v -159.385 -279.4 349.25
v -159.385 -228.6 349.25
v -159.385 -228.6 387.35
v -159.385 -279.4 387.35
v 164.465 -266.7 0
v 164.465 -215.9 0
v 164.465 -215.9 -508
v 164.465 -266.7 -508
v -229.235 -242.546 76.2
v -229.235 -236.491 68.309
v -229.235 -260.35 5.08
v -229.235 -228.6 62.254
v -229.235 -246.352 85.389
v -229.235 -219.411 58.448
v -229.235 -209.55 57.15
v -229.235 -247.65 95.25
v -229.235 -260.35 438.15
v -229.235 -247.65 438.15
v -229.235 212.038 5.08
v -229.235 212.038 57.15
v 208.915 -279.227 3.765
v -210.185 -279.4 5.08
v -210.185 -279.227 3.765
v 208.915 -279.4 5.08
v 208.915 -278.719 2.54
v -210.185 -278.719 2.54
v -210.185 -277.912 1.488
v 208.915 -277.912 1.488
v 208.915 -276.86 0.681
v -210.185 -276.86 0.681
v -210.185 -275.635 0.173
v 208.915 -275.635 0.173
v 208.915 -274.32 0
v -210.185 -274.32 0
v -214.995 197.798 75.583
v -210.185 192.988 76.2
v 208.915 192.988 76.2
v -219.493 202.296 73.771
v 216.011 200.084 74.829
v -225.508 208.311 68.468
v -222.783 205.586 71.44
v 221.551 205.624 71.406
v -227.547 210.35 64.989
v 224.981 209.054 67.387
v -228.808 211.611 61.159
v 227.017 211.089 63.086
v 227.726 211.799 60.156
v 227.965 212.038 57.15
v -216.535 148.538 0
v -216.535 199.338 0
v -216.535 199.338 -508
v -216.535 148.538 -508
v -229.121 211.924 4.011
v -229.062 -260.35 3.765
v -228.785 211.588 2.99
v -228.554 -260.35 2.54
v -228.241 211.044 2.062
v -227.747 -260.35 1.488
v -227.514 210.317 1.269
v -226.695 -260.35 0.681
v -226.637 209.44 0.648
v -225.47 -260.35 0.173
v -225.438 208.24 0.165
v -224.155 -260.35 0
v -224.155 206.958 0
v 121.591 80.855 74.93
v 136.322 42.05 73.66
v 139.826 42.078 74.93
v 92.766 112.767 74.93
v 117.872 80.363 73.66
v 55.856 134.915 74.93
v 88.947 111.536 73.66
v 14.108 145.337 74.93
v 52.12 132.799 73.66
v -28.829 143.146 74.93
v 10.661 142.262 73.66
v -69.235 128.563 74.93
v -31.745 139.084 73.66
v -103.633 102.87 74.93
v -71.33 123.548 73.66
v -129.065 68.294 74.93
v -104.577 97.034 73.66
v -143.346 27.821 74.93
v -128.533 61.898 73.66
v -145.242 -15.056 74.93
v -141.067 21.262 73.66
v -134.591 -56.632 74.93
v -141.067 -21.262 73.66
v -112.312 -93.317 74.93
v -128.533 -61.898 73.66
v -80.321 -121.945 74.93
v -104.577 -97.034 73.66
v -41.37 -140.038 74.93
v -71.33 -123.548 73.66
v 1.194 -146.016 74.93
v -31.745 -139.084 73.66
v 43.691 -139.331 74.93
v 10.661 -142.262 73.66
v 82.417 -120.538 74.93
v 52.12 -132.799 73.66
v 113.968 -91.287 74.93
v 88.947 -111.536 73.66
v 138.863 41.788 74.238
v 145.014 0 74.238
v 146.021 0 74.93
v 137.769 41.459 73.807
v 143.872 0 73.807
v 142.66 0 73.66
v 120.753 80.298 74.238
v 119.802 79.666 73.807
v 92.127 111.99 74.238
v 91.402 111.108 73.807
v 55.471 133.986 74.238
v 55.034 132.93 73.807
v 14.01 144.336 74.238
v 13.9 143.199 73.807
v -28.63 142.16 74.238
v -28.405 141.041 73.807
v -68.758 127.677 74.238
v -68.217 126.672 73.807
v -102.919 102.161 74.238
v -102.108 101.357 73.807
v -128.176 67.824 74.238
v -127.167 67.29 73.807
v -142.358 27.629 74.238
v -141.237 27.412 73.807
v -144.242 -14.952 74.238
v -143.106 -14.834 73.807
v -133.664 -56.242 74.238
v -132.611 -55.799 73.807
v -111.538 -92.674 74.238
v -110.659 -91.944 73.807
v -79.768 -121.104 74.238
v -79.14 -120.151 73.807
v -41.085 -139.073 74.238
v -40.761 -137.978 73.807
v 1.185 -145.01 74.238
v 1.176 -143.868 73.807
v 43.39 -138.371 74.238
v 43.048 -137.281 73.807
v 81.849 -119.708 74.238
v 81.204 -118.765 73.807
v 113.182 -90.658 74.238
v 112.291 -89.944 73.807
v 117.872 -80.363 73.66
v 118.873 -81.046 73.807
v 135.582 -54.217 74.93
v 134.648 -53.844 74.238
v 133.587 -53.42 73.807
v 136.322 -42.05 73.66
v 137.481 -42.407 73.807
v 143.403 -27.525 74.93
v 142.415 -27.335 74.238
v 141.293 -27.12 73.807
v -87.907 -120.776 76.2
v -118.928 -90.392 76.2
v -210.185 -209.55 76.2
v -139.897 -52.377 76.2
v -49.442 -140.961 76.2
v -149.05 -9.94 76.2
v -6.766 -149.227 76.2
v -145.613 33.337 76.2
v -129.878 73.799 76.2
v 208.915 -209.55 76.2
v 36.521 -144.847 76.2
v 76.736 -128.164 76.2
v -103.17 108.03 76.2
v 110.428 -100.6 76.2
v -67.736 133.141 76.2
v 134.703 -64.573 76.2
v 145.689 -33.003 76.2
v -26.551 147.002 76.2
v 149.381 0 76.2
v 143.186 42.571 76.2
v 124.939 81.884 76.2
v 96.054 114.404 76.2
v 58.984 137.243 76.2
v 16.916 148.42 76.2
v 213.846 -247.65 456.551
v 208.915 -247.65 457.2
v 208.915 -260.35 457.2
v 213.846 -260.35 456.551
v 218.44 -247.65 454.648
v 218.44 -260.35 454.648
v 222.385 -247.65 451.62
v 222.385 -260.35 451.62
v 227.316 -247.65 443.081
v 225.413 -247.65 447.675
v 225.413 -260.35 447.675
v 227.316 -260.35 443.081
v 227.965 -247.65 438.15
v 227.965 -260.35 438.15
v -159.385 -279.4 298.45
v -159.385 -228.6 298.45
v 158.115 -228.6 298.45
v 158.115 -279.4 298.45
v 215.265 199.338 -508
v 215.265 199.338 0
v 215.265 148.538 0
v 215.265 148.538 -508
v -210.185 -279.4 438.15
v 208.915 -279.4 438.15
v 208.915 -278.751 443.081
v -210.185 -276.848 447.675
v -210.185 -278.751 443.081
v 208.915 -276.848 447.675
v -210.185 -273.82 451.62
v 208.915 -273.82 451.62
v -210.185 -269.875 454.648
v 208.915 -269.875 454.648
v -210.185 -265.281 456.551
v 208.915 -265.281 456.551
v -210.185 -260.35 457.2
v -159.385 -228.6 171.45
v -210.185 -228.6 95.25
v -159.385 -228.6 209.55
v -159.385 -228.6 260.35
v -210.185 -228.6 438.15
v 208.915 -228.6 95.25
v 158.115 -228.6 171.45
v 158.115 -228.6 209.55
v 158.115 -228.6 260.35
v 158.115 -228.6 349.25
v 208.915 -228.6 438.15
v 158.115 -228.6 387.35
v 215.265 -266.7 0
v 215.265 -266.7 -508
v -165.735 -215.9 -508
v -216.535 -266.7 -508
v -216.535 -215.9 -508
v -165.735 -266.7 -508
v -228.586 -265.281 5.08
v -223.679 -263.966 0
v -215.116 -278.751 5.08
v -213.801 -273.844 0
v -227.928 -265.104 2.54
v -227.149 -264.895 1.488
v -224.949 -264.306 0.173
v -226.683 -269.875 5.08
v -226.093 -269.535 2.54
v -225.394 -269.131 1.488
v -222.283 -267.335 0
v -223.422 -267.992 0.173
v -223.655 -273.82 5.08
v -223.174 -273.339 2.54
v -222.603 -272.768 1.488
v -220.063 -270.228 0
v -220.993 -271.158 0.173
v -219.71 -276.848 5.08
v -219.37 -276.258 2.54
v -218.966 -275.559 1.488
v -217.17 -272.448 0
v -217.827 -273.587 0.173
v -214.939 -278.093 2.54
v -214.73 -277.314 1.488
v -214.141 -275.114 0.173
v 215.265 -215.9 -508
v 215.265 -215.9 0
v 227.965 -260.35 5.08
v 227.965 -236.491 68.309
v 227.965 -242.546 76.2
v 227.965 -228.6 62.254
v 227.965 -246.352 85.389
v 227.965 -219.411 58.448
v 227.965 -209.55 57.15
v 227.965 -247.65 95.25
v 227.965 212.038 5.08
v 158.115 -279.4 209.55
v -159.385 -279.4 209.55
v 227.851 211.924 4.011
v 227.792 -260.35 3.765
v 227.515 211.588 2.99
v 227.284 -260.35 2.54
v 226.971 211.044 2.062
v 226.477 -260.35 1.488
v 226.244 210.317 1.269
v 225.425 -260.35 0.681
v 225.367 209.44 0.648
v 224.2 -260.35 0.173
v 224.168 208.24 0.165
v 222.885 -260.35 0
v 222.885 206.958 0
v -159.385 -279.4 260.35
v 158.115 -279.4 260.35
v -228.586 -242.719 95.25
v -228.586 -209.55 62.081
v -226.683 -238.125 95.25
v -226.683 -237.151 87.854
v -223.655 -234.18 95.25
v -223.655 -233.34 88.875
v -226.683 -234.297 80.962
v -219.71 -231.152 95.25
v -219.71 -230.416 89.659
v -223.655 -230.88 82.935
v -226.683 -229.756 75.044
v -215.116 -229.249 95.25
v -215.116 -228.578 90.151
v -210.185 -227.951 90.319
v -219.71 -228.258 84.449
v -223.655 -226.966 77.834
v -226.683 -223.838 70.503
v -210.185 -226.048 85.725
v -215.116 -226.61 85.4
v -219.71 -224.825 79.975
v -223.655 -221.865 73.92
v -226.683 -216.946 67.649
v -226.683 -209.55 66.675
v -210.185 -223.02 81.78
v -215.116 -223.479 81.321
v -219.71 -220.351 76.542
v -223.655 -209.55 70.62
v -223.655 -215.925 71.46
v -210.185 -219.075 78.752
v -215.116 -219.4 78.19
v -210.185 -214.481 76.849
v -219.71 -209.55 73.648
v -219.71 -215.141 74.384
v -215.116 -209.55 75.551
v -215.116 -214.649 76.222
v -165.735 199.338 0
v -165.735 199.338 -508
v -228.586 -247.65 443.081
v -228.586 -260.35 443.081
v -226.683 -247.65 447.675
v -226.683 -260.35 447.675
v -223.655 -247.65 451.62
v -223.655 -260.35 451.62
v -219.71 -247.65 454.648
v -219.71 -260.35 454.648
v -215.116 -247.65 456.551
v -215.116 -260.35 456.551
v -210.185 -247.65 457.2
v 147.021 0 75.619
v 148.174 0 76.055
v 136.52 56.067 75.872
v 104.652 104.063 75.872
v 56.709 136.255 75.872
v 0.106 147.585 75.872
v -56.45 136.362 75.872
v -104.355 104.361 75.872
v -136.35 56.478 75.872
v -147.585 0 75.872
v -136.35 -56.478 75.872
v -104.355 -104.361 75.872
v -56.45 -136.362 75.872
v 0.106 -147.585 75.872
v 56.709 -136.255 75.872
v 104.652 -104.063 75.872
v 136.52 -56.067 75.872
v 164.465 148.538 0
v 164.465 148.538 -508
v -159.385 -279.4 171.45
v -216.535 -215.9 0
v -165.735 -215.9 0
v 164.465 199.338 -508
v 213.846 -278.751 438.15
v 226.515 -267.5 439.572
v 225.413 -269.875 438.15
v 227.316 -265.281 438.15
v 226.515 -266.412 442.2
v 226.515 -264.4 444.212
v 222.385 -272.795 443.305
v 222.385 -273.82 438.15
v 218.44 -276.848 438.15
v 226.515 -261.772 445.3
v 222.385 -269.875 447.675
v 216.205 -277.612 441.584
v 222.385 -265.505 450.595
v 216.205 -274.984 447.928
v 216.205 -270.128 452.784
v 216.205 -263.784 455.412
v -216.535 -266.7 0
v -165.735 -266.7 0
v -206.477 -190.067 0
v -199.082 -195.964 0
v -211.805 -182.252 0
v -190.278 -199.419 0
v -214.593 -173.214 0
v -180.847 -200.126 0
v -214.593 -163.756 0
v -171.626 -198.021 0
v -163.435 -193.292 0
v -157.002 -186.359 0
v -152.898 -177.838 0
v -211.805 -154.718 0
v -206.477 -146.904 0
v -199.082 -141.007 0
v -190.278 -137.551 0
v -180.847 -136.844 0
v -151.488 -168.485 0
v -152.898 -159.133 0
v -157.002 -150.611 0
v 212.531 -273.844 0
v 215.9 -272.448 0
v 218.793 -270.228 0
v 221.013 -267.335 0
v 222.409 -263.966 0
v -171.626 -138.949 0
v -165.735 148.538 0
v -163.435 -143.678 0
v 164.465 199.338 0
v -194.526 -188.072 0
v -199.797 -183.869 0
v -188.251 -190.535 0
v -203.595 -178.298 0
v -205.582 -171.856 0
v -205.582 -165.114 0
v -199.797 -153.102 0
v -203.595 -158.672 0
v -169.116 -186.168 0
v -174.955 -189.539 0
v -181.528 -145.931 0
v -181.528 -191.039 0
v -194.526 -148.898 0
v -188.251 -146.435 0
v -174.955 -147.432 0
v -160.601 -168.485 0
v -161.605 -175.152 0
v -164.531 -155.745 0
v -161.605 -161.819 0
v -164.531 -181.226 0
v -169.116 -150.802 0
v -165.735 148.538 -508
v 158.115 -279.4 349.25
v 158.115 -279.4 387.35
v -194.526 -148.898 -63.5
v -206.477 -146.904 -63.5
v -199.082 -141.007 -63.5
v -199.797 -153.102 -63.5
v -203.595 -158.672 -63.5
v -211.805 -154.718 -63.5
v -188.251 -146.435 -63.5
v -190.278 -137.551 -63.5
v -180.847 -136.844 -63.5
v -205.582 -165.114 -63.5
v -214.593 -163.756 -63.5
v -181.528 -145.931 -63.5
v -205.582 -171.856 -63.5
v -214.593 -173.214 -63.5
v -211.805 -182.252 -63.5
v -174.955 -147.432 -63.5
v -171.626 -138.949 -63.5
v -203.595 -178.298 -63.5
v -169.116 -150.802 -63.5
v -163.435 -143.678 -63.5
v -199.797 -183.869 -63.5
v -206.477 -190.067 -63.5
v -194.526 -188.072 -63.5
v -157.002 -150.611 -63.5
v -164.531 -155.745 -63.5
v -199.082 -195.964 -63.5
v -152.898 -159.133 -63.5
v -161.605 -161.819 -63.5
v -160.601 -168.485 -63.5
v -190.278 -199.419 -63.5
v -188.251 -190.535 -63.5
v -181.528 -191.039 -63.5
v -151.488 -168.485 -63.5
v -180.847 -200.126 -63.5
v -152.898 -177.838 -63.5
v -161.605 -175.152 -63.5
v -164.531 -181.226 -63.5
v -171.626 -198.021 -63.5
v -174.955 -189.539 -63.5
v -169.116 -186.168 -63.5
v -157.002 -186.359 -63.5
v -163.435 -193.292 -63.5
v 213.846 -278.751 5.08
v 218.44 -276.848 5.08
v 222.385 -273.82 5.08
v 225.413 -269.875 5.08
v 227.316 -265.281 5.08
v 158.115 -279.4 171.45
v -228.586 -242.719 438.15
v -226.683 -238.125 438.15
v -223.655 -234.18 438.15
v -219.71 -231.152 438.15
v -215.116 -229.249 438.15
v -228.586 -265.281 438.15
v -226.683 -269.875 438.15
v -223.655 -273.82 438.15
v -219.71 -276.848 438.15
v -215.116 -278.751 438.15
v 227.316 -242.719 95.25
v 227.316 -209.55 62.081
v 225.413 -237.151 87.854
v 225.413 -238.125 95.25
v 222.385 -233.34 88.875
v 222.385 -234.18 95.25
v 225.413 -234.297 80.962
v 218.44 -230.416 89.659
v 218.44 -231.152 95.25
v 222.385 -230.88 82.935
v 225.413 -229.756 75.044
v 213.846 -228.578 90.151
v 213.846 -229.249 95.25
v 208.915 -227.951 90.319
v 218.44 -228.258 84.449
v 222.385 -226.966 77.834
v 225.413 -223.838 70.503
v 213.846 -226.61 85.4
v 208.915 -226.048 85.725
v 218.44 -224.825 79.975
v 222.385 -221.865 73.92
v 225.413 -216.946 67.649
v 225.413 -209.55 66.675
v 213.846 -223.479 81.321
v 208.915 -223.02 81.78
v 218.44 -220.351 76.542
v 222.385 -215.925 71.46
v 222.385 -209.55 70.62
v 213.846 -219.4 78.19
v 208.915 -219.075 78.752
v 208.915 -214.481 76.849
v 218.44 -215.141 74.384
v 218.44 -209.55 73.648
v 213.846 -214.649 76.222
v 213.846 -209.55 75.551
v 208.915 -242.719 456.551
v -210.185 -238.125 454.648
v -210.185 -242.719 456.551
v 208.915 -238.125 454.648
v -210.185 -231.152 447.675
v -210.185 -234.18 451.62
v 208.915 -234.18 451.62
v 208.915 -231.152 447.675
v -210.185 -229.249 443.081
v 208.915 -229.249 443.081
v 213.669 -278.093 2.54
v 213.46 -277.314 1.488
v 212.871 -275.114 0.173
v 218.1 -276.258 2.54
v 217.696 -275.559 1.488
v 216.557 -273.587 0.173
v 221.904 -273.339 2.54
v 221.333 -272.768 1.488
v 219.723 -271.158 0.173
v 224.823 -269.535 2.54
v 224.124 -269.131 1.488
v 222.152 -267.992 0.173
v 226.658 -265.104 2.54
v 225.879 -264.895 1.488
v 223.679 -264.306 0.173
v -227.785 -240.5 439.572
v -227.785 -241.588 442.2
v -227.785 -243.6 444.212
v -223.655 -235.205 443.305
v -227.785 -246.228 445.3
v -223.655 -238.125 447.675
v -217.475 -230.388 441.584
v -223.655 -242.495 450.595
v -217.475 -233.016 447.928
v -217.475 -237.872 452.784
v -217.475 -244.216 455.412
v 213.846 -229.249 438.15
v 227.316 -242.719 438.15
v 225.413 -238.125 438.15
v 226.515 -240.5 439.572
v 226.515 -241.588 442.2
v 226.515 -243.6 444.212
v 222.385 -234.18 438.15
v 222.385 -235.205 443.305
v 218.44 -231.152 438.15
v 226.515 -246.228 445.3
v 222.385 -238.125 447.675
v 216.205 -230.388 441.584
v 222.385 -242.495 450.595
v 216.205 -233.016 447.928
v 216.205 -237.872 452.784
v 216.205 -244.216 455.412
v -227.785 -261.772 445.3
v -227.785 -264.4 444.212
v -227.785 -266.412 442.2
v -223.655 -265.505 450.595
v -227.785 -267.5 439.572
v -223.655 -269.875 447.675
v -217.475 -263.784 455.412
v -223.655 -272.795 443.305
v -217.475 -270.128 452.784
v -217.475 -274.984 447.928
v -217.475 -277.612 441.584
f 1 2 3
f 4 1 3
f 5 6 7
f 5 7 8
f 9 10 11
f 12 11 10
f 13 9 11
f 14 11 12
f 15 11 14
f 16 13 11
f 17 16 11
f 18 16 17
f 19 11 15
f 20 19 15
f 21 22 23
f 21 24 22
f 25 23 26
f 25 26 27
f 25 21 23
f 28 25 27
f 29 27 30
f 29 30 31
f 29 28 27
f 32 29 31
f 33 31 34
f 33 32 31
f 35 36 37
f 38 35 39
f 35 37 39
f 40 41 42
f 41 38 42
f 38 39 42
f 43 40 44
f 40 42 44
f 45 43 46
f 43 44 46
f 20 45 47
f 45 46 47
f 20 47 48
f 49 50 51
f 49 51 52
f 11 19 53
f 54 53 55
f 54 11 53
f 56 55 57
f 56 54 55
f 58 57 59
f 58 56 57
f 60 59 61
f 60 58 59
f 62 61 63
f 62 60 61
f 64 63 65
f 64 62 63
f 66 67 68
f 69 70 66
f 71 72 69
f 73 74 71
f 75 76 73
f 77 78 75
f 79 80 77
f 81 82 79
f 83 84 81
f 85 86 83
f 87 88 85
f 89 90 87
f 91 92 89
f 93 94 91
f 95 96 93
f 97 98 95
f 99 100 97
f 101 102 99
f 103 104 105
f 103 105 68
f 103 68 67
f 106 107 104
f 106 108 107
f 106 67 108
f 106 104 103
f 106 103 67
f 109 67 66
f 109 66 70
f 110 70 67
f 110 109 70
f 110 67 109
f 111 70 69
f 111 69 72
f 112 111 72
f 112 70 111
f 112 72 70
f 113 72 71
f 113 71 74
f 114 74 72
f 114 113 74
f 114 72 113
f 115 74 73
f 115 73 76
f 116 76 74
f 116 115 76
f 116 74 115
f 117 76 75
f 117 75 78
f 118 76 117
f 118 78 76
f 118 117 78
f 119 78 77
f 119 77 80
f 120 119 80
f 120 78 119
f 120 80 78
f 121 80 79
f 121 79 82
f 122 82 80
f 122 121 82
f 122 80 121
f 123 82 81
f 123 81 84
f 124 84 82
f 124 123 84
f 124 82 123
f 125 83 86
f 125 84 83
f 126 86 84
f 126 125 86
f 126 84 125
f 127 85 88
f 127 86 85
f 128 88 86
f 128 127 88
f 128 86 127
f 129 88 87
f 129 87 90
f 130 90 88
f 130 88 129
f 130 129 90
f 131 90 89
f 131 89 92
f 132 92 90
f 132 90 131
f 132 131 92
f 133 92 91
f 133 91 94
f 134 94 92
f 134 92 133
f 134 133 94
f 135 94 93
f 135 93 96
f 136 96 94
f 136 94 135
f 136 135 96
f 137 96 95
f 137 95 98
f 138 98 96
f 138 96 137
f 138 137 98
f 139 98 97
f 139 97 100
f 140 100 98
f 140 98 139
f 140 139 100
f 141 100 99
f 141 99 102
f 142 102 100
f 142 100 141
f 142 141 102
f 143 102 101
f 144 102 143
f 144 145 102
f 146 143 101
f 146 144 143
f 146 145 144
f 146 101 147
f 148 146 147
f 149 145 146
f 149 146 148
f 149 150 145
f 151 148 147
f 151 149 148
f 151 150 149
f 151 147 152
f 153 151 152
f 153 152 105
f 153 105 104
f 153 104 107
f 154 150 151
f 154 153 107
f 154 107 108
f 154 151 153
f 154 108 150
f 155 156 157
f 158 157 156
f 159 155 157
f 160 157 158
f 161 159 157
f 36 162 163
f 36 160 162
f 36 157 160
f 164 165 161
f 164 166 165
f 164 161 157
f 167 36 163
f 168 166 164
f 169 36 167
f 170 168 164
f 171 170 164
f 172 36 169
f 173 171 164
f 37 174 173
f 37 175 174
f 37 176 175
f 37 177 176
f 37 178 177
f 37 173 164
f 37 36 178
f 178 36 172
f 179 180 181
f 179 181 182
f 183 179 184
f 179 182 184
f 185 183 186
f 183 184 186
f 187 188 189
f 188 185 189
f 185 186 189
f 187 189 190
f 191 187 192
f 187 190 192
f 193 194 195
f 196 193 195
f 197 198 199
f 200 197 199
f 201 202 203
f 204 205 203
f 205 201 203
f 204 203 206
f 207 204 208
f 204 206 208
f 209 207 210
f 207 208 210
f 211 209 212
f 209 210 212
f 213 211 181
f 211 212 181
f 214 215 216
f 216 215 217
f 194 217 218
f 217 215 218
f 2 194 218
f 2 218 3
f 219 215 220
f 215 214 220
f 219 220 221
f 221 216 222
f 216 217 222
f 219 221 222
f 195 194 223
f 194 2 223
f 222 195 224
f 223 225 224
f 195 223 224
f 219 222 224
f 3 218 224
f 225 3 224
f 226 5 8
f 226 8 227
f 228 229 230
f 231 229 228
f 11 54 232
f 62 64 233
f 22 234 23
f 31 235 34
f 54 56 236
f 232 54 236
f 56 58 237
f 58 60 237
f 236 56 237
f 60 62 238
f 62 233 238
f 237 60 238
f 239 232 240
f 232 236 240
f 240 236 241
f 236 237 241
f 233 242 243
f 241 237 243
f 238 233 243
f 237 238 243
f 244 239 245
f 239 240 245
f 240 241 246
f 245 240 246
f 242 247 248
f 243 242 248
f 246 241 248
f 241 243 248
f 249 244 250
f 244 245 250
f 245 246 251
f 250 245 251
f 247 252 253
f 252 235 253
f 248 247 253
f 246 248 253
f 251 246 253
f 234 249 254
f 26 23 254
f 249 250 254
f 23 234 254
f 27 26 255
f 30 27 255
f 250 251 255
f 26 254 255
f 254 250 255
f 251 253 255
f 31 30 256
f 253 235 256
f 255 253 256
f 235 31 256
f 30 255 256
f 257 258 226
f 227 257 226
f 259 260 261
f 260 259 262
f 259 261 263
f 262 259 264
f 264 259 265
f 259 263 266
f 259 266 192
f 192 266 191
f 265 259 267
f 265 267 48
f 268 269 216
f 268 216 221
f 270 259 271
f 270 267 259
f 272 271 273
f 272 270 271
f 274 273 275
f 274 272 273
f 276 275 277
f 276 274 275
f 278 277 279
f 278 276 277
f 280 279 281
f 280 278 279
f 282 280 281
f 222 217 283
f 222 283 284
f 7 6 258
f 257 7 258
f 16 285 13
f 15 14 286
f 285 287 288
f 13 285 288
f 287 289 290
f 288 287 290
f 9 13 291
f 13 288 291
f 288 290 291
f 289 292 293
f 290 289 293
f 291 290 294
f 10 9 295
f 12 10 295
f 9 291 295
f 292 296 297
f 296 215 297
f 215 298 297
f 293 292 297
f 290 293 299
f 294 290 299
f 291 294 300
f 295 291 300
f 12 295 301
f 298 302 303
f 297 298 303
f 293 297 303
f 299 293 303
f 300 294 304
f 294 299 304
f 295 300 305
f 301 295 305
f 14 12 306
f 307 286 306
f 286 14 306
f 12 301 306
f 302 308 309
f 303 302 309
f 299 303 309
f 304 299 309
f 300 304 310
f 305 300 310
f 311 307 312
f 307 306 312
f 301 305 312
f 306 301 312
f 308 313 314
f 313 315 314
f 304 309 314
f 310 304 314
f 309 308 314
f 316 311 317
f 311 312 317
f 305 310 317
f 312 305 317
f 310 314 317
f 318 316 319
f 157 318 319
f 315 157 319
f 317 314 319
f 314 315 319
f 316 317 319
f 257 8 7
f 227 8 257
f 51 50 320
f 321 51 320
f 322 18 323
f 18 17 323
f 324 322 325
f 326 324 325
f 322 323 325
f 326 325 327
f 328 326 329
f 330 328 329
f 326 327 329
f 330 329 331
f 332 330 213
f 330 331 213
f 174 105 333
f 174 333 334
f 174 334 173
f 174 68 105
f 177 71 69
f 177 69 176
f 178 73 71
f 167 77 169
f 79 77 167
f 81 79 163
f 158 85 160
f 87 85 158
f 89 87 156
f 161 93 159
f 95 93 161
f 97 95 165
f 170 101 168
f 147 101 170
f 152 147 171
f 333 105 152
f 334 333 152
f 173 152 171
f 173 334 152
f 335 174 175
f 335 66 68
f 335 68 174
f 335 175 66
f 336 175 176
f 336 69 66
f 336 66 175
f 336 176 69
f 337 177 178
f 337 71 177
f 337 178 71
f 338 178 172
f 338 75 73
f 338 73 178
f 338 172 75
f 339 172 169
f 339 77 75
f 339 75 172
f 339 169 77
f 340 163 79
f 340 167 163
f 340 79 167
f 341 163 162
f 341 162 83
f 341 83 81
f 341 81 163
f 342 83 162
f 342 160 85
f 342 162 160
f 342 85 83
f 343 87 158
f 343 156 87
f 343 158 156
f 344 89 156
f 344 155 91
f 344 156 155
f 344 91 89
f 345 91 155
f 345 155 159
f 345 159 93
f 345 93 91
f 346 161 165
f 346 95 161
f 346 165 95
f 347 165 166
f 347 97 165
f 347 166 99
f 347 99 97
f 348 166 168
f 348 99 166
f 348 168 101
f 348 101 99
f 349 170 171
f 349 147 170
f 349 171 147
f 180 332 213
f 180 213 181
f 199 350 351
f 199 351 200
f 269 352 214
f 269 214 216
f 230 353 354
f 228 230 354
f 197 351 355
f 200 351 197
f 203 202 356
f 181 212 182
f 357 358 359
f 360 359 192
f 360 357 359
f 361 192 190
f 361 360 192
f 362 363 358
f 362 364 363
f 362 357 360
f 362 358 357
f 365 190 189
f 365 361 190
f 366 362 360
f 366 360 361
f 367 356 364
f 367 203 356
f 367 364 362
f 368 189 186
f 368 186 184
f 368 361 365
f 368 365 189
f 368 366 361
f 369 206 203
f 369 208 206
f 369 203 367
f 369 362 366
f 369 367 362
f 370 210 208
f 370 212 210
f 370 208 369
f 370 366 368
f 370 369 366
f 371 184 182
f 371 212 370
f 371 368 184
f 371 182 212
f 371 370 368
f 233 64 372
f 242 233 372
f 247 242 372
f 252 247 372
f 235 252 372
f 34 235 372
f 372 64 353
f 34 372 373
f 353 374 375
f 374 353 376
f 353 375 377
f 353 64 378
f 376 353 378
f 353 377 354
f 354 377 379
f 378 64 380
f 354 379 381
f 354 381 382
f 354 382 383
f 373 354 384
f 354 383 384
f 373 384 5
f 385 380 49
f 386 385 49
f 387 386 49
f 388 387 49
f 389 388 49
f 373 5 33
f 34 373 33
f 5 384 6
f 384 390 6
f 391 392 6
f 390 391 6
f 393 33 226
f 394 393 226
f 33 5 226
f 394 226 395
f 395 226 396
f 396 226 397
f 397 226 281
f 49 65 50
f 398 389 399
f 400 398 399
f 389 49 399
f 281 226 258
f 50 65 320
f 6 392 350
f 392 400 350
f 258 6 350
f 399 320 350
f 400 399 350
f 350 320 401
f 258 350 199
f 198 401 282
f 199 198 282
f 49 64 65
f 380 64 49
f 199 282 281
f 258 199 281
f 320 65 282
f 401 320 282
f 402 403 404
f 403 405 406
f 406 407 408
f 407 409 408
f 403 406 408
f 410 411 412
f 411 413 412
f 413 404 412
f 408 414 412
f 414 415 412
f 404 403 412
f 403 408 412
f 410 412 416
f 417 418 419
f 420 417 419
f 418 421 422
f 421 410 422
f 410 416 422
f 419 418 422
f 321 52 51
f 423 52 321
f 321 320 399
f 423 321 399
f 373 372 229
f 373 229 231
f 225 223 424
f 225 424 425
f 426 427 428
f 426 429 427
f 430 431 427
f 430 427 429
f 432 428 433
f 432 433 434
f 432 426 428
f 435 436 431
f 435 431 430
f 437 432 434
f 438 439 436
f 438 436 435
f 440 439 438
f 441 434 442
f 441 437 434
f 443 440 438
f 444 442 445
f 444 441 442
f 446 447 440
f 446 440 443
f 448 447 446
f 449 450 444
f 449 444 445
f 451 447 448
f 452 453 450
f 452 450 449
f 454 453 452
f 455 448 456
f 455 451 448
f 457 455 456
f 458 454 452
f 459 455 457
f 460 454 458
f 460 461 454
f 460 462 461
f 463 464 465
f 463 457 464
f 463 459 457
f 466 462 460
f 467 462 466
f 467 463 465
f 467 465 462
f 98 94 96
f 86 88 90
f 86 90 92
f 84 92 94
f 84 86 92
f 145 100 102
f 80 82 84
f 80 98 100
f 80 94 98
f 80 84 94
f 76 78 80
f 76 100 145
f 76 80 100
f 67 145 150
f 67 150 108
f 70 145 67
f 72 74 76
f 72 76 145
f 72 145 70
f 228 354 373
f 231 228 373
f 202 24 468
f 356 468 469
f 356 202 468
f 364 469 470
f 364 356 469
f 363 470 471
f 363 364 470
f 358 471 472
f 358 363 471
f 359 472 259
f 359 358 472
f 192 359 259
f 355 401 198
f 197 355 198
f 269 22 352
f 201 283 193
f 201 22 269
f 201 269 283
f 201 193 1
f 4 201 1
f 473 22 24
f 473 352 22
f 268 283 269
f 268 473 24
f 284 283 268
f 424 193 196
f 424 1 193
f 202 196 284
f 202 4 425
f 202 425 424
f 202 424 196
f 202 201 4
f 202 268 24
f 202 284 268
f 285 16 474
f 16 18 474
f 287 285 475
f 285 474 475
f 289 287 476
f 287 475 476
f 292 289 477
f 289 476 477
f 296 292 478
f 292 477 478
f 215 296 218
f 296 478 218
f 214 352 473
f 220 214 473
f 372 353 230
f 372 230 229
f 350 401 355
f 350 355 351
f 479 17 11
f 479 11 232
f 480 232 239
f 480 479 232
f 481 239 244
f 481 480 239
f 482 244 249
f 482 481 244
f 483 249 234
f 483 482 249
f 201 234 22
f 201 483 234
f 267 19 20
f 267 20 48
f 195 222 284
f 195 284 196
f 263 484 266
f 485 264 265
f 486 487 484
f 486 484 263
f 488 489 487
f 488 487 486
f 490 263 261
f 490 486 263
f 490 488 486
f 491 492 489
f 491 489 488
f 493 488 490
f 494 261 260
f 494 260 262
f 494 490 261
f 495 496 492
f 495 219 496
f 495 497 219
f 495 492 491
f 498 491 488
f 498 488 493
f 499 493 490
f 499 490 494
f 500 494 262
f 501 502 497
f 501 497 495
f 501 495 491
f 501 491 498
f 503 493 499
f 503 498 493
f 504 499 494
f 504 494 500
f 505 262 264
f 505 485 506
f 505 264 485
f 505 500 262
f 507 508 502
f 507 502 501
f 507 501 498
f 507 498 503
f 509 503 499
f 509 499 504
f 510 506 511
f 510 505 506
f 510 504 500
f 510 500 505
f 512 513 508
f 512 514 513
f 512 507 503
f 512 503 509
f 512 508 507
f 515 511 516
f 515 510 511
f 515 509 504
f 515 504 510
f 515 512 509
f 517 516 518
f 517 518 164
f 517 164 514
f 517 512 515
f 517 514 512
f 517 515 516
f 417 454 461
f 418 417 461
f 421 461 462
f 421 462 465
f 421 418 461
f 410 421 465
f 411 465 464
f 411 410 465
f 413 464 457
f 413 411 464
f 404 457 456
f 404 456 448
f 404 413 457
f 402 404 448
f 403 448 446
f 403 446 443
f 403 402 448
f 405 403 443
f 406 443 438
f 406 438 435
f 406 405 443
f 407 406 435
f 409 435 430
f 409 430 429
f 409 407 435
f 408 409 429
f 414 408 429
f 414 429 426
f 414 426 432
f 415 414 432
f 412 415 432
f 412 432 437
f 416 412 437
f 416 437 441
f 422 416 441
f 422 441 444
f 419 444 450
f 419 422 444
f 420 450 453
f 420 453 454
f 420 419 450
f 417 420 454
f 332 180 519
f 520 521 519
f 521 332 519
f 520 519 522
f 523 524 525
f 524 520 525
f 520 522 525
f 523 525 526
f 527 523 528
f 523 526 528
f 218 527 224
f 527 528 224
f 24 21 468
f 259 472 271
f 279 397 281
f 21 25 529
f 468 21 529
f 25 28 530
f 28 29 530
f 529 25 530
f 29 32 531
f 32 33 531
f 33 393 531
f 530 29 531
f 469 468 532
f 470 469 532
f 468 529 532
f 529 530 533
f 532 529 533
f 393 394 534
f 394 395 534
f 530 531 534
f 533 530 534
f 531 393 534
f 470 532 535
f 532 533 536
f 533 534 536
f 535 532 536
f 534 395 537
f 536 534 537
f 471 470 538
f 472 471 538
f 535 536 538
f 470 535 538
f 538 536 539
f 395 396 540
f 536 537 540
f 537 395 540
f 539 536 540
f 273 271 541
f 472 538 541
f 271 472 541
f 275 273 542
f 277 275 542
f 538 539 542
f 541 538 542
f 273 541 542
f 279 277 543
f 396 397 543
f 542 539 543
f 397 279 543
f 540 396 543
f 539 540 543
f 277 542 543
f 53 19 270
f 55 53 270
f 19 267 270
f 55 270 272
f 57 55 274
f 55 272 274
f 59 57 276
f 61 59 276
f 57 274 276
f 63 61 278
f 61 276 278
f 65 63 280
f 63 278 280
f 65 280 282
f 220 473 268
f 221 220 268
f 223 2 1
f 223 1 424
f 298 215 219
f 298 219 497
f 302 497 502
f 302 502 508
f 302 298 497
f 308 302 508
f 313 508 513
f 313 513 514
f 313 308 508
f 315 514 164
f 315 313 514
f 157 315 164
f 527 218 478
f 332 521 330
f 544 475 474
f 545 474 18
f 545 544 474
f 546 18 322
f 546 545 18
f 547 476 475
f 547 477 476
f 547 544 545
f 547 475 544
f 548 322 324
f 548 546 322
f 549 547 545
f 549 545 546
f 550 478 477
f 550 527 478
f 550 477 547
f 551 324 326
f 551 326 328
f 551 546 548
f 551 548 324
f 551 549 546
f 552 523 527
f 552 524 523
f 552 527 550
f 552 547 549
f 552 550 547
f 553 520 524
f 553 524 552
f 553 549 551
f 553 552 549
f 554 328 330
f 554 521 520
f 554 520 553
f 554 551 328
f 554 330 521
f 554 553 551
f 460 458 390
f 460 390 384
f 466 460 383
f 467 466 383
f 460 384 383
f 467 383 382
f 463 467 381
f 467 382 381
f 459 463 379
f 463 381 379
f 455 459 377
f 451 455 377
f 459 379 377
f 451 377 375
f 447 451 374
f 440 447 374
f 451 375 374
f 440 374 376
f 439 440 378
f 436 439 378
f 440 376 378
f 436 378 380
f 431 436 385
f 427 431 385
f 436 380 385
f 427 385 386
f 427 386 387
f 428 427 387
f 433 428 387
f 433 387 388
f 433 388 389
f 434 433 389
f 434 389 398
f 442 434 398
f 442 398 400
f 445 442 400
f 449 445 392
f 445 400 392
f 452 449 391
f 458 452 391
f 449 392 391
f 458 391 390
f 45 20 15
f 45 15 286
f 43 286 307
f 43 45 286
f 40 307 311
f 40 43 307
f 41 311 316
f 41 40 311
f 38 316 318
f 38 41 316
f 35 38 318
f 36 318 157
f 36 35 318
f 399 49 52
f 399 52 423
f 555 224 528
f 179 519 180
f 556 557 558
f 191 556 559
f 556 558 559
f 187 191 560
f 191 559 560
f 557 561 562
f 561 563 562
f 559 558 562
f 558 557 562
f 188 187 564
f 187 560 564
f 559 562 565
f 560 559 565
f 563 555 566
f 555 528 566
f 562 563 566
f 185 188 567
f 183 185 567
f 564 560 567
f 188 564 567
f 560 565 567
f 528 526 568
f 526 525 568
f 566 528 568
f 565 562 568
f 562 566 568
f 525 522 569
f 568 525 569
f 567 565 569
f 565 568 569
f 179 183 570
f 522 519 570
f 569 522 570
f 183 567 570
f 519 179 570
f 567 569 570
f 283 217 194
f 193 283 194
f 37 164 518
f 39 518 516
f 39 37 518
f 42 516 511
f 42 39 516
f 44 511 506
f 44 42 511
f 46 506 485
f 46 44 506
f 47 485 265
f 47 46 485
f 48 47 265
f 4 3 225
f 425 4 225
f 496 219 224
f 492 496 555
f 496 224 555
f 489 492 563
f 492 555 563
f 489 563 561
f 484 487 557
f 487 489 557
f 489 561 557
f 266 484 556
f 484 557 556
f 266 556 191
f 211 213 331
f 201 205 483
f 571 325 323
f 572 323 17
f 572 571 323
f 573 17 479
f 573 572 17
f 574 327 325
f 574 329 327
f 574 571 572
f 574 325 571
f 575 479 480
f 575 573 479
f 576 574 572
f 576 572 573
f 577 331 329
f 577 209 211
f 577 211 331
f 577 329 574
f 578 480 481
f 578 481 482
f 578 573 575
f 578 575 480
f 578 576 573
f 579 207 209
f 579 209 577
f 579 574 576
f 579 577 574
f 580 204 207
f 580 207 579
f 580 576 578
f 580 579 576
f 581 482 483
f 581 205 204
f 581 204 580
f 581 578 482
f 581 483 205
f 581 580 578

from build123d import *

# Parameters (mm, degrees)
F2_W      = 457.2
F2_H      = 457.2
F3_DEPTH  = 50.8
F0_W      = 457.2
F0_H      = 457.2
F4_DEPTH  = 76.2
F5_W      = 50.8
F5_H      = 50.8
F6_DEPTH  = 508
F7_R      = 19.05
F8_W      = 317.5
F8_H      = 38.1
F9_DEPTH  = 63.5
F10_R     = 31.7295136587
F10_R_2   = 22.617106641
F11_DEPTH = 63.5
F12_R     = 147.0598184699
F13_DEPTH = 2.54
F15_R     = 5.08
F16_R     = 5.08


# Not quite as in the source:
# - a fillet or chamfer that OpenCascade refuses, or shapes differently, is made with other operations: its cross-section is extruded or revolved along the edge and cut away or added


with BuildPart() as f3:
    # F2 (on offset) → F3 (new body)
    with BuildSketch(Plane.XZ.offset(228.6)):
        with Locations((-0.6349999458, 228.6)):
            Rectangle(F2_W, F2_H)
    extrude(amount=F3_DEPTH)

    # F0 (on Top) → F4 (join)
    with BuildSketch(Plane.XY):
        with Locations((-0.6349999458, -16.5623649633)):
            Rectangle(F0_W, F0_H)
    extrude(amount=F4_DEPTH)

    # F5 (on face) → F6 (join)
    with BuildSketch(Plane(origin=(0, 0, 0), x_dir=(1, 0, 0), z_dir=(0, 0, -1))):
        with Locations((-191.1349999458, 241.3)):
            Rectangle(F5_W, F5_H)
        with Locations((189.8650000542, 241.3)):
            Rectangle(F5_W, F5_H)
        with Locations((189.8650000542, -173.9376350367)):
            Rectangle(F5_W, F5_H)
        with Locations((-191.1349999458, -173.9376350367)):
            Rectangle(F5_W, F5_H)
    extrude(amount=F6_DEPTH)

    # F7
    f7_edges = [f3.edges().sort_by_distance(p)[0] for p in [
        (-0.635, -228.6, 76.2),
        (-0.635, -228.6, 457.2),
        (-229.235, -228.6, 266.7),
        (227.965, -228.6, 266.7),
        (-0.635, -279.4, 457.2),
        (227.965, -279.4, 228.6),
        (227.965, -254, 457.2),
        (-229.235, -254, 457.2),
        (-229.235, -8.281182, 76.2),
        (227.965, -8.281182, 76.2),
        (-0.635, 212.037635, 76.2),
        (-229.235, -279.4, 228.6),
    ]]
    fillet(f7_edges, radius=F7_R)

    # F8 (on face) → F9 (cut, symmetric)
    with BuildSketch(Plane.XZ.offset(279.4)):
        with Locations((-0.6349999458, 368.3)):
            Rectangle(F8_W, F8_H)
        with Locations((-0.6349999458, 279.4)):
            Rectangle(F8_W, F8_H)
        with Locations((-0.6349999458, 190.5)):
            Rectangle(F8_W, F8_H)
    extrude(amount=F9_DEPTH, both=True, mode=Mode.SUBTRACT)

    # F10 (on face) → F11 (join)
    with BuildSketch(Plane(origin=(0, 0, 0), x_dir=(1, 0, 0), z_dir=(0, 0, -1))):
        with Locations((-183.2177340984, 168.4852540493)):
            Circle(F10_R)
        with Locations((-183.2177340984, 168.4852540493)):
            Circle(F10_R_2, mode=Mode.SUBTRACT)
    extrude(amount=F11_DEPTH)

    # F12 (on face) → F13 (cut)
    with BuildSketch(Plane.XY.offset(76.2)):
        Circle(F12_R)
    extrude(amount=-F13_DEPTH, mode=Mode.SUBTRACT)

    # F14: fillet of radius 5.08 on 1 edges, made by hand

    # F14_s1 → F14_t2 (revolve)
    with BuildSketch(Plane.XZ):
        with BuildLine():
            ThreePointArc((147.0598184699, 76.2), (145.2004094187, 74.3405909488), (142.6604094187, 73.66))
            Line((142.6604094187, 73.66), (147.0598184699, 73.66))
            Line((147.0598184699, 73.66), (147.0598184699, 76.2))
        make_face()
    revolve(axis=Axis((0, 0, 73.66), (0, 0, 1)))

    # F15
    f15_edges = [f3.edges().sort_by_distance(p)[0] for p in [
        (-147.059818, 0, 76.2),
    ]]
    fillet(f15_edges, radius=F15_R)

    # F16
    f16_edges = [f3.edges().sort_by_distance(p)[0] for p in [
        (-229.235, -24.156182, 0),
        (-0.635, 212.037635, 0),
        (227.965, -24.156182, 0),
        (-0.635, -279.4, 0),
        (222.385384, -273.820384, 0),
        (-223.655384, -273.820384, 0),
    ]]
    fillet(f16_edges, radius=F16_R)


solid = f3.part
